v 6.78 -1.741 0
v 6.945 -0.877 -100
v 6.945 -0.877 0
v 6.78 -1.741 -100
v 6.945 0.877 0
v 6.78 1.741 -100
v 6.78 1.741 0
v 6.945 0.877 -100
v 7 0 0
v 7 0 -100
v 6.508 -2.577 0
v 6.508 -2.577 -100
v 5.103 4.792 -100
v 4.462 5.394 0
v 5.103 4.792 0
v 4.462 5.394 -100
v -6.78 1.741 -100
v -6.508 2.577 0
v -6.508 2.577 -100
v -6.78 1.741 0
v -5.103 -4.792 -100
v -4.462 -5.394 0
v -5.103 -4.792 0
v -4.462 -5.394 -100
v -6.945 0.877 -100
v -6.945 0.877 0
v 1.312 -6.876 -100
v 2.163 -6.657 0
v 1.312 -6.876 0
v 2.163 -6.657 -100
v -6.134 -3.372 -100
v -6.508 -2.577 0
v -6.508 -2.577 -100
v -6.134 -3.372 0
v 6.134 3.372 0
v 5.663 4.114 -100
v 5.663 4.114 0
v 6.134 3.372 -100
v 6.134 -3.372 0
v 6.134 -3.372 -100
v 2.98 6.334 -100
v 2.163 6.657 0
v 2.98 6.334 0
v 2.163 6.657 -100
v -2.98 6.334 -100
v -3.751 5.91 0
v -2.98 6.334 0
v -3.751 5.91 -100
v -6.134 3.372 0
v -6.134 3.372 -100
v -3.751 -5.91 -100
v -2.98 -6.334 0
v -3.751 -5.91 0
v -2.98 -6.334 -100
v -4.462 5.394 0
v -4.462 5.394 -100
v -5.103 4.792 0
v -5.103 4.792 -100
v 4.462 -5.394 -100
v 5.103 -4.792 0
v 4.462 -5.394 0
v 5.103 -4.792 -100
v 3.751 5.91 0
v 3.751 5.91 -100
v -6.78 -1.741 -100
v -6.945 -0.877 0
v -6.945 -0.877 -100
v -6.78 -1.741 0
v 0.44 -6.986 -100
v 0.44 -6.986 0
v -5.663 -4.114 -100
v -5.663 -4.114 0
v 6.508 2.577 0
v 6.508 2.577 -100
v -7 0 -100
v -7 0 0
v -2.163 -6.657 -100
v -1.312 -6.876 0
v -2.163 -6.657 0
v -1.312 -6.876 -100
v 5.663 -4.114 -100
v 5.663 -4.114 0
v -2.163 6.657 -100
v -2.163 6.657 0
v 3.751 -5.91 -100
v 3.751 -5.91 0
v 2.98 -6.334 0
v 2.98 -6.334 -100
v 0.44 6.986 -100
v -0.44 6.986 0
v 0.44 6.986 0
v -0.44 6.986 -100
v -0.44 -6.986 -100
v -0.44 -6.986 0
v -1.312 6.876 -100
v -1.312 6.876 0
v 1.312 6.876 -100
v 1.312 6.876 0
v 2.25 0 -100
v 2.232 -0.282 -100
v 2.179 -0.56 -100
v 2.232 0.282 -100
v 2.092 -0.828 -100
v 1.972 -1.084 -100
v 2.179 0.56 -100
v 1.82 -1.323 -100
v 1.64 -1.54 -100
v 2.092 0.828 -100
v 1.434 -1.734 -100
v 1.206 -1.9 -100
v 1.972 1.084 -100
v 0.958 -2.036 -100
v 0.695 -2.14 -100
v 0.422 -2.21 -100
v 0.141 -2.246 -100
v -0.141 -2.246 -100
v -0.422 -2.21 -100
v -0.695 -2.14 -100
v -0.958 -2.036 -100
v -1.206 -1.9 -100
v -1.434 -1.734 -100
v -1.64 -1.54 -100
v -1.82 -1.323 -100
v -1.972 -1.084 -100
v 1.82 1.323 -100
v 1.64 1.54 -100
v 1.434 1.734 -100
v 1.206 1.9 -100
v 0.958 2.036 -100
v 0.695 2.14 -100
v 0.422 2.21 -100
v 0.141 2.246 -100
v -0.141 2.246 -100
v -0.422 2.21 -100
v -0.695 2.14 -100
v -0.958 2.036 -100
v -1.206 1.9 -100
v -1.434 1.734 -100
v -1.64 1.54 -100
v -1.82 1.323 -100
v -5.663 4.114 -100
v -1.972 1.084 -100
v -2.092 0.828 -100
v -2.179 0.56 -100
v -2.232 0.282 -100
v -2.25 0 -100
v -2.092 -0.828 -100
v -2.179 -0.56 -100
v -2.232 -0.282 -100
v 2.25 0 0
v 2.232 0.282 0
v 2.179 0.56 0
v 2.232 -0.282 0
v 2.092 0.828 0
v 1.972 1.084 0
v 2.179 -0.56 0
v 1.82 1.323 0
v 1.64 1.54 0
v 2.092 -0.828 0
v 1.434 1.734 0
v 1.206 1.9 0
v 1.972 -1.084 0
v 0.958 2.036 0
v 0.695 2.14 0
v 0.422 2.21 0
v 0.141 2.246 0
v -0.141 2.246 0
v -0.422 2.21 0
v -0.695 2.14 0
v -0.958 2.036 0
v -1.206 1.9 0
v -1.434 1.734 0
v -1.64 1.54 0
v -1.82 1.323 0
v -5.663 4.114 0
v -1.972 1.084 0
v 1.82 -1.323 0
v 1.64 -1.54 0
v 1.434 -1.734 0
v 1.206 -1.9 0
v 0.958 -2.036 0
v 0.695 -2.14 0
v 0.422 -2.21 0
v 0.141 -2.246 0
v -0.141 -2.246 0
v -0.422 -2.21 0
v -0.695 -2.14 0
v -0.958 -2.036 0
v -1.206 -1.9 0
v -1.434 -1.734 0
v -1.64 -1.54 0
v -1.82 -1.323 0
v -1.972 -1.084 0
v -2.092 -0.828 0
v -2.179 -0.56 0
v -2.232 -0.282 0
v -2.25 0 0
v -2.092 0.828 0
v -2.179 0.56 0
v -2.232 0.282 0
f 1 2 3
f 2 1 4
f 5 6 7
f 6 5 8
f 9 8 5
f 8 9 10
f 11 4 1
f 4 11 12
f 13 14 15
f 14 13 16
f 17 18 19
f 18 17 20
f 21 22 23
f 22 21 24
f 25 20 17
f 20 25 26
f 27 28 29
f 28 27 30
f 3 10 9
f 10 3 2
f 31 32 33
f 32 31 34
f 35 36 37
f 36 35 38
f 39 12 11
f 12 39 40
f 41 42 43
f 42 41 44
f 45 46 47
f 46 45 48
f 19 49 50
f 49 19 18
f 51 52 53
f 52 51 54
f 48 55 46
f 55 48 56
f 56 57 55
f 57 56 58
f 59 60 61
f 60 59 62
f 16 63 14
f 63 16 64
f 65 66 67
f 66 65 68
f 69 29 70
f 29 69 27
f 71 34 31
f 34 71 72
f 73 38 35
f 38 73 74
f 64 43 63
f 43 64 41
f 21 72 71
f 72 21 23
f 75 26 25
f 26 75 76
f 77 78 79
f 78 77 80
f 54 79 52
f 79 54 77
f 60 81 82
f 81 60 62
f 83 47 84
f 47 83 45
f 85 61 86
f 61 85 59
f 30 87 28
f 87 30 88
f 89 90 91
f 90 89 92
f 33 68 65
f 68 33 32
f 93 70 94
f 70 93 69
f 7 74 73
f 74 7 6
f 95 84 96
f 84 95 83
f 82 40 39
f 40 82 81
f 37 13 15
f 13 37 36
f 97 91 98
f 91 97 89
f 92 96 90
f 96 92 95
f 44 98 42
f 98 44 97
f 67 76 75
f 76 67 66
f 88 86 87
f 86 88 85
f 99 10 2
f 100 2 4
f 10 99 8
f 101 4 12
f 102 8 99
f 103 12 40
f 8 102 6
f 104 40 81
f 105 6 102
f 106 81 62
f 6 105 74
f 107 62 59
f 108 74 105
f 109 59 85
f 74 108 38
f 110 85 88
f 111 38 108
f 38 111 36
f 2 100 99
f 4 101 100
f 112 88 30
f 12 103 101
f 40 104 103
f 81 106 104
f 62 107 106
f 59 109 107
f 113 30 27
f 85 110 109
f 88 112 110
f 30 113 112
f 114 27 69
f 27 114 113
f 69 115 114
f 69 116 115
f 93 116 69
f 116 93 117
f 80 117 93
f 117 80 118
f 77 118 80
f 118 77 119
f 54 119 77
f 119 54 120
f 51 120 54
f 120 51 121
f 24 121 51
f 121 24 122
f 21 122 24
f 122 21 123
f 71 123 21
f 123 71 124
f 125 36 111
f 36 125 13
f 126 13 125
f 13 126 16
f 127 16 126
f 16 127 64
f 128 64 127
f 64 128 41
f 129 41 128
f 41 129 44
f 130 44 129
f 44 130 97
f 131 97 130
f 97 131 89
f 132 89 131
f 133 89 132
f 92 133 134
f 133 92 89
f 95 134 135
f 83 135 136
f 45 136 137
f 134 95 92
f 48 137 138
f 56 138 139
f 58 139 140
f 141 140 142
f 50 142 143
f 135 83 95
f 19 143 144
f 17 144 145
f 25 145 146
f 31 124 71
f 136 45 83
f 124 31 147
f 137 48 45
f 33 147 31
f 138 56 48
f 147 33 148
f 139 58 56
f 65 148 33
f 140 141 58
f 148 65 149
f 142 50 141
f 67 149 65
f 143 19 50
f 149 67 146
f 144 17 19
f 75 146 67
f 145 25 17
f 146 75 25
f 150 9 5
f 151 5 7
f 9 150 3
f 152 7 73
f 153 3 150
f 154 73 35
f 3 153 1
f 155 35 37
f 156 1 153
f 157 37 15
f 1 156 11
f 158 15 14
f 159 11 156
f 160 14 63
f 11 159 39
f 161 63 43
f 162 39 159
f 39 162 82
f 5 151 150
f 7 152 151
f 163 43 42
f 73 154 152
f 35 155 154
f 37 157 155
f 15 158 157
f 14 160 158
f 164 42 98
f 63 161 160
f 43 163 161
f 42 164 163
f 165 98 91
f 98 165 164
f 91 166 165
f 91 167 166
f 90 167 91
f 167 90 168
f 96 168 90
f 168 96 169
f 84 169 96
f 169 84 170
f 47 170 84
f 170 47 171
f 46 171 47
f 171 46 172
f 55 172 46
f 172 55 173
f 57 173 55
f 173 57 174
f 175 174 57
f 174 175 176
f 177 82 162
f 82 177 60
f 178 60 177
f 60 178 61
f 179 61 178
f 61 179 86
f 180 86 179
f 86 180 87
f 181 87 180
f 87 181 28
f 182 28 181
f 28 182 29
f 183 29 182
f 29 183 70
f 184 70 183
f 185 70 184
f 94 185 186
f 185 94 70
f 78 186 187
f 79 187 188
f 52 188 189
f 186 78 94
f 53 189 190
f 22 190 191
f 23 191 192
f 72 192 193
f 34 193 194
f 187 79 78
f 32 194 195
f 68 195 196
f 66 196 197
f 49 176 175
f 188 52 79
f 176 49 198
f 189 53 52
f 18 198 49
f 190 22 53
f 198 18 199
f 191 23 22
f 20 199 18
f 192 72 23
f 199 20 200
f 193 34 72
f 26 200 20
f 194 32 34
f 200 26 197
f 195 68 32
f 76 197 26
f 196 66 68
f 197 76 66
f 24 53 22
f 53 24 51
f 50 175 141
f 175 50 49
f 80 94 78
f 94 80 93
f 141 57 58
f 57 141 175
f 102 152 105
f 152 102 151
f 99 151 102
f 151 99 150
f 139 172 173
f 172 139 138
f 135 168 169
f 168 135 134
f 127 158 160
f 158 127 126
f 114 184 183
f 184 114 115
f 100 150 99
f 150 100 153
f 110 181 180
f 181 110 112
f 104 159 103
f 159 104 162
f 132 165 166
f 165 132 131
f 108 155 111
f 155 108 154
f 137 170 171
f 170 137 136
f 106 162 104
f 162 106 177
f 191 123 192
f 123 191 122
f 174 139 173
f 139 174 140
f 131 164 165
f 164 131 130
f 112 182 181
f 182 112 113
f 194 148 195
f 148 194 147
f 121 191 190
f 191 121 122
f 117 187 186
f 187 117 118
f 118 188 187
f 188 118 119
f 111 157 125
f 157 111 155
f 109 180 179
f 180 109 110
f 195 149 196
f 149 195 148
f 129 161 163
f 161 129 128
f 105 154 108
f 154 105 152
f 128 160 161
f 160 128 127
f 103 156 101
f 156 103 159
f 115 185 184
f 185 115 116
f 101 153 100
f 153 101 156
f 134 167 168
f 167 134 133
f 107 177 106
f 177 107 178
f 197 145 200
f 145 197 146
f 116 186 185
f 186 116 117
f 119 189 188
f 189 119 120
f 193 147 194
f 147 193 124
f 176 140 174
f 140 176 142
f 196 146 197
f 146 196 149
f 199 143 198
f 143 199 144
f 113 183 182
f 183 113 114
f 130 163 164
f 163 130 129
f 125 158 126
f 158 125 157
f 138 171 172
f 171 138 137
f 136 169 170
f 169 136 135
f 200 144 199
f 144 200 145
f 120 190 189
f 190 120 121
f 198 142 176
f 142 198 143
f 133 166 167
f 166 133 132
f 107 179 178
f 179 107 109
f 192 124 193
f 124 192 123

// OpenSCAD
$fn = 50;


difference() {
	union() {
		translate(v = [0, 0, -100.0000000000]) {
			cylinder(h = 100, r = 7.0000000000);
		}
		cylinder(h = 0, r = 10.0000000000);
	}
	union() {
		#translate(v = [0, 0, -100]) {
			cylinder(h = 100, r = 2.2500000000);
		}
	}
}
